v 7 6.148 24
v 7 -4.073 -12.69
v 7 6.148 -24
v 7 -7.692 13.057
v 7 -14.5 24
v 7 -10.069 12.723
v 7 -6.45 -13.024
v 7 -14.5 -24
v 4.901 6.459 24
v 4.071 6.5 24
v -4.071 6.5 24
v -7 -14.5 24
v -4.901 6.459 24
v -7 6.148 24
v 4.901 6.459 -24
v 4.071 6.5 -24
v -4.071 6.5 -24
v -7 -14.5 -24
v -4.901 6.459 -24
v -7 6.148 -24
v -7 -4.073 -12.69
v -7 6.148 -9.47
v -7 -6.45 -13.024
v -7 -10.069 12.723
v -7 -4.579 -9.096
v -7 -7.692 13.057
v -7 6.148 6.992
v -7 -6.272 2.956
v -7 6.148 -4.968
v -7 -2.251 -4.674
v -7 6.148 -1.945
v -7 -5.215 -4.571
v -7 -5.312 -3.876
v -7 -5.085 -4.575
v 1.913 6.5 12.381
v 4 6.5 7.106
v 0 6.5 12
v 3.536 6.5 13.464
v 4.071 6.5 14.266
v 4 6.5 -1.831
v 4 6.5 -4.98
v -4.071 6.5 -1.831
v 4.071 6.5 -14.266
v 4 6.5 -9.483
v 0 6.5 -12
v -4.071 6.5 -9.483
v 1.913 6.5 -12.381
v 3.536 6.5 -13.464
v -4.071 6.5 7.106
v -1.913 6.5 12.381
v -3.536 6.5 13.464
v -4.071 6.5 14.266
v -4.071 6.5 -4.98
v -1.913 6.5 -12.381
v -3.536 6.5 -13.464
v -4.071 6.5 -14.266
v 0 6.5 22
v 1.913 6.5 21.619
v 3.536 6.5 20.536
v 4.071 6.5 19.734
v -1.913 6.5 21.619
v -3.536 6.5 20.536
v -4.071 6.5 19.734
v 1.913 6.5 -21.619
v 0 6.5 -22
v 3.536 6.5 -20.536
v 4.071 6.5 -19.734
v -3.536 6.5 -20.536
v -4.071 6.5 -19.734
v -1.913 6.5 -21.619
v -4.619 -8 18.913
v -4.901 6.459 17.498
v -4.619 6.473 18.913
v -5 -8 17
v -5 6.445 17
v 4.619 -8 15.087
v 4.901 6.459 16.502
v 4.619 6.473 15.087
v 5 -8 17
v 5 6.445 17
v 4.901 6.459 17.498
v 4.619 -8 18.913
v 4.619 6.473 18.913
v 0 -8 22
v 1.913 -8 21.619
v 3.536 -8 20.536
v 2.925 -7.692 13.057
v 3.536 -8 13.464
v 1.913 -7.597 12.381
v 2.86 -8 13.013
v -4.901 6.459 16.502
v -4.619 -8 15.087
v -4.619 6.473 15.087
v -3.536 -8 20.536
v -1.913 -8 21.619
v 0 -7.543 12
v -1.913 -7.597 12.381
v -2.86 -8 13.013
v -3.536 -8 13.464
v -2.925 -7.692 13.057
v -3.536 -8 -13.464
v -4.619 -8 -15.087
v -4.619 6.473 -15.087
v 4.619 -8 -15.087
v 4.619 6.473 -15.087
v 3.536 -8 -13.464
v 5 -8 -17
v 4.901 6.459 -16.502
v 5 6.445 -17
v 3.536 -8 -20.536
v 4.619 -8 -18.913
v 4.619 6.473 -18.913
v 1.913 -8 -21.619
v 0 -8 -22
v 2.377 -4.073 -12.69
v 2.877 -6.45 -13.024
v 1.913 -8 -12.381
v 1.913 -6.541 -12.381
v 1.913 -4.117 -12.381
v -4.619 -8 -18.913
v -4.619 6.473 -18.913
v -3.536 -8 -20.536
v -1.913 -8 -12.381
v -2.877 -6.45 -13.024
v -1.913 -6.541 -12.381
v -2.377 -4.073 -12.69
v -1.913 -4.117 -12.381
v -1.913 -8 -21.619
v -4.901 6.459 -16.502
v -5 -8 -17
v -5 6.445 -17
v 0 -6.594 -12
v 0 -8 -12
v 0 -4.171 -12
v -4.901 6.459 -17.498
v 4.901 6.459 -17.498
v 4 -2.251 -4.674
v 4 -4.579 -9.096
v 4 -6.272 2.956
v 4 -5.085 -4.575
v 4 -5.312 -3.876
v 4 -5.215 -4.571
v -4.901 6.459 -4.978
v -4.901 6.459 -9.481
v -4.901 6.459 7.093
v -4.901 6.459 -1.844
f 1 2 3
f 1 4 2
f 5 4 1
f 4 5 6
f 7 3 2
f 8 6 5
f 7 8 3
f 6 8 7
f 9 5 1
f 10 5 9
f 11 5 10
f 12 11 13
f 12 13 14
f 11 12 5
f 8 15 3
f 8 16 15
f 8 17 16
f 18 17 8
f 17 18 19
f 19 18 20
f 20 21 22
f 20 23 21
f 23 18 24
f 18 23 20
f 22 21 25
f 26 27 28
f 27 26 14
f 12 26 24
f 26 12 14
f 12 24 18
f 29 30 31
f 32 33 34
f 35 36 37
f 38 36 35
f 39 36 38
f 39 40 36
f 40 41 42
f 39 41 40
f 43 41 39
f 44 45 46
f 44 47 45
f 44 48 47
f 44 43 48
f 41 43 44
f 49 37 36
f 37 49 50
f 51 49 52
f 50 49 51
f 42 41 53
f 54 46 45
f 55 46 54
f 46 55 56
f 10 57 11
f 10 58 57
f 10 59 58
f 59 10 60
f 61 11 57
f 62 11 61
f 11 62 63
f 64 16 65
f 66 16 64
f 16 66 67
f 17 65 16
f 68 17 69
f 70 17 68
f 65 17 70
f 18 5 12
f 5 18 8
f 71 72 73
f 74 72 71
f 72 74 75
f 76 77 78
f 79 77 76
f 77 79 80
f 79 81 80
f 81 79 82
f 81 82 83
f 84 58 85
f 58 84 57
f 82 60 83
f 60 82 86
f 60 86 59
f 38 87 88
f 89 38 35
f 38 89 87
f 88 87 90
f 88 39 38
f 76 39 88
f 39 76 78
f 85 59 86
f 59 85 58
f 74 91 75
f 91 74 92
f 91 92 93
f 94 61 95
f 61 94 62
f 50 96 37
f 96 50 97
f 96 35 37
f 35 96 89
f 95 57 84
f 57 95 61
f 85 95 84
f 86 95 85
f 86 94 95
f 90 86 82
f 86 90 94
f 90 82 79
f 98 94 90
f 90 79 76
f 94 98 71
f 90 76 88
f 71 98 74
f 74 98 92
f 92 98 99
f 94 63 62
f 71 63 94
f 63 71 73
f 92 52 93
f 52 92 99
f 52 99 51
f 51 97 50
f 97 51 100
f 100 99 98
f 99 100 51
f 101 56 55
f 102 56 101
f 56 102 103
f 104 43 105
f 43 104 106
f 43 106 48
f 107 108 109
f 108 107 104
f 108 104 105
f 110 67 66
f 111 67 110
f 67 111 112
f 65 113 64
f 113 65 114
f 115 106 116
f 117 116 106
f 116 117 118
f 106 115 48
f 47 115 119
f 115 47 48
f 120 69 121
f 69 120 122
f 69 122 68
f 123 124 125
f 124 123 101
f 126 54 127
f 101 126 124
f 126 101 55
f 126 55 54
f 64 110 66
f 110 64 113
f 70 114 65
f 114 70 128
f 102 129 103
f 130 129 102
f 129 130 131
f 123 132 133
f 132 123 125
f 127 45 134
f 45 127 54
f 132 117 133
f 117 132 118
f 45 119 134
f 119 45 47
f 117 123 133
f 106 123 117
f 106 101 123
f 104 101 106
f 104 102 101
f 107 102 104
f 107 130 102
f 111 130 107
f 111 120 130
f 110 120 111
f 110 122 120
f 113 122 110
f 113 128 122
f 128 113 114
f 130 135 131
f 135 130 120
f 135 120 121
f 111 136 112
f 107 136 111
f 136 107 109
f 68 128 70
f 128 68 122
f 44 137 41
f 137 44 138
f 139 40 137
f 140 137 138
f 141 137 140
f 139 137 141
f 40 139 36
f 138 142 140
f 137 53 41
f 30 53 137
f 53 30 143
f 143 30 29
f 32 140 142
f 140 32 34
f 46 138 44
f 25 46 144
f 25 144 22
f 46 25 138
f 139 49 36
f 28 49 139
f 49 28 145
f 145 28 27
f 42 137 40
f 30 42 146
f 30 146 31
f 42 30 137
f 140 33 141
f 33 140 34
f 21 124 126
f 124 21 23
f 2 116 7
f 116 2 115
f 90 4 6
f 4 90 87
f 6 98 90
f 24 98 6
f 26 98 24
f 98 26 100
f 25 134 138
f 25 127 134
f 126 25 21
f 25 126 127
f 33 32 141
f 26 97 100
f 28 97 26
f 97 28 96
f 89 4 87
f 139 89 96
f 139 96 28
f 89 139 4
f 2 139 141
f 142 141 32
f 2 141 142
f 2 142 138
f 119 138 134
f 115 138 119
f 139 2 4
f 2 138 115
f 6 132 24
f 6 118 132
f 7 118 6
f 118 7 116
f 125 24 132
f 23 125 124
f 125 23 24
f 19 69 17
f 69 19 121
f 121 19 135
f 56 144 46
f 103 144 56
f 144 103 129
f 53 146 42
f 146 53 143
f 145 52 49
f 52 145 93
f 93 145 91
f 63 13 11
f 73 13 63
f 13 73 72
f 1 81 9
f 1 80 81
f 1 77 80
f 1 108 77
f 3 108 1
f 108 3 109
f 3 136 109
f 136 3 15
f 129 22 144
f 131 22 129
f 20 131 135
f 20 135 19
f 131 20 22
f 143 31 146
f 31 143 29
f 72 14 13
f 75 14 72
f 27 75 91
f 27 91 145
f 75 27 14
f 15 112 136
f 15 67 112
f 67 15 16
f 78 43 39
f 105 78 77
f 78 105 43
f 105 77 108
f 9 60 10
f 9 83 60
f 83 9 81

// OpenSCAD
diameter=10;
height=4;
number=3;
distance=5;
baseline=30; 


module maghole(diameter,height,number,back) {
		translate([0,height*(number-2)/2,0])
        rotate([90,0,0])
         cylinder(r=diameter/2,h=height*(2*number-1),center=true);
    if(back == 1) {
		translate([0,-height*2*(number+1)/2,0])
        rotate([90,0,0])
         cylinder(r=diameter/2,h=height*number,center=true);
    }
}

module smaghole(diameter,height,number,back) {
		translate([0,.15+height*(number-2)/2,0])
        rotate([90,0,0])
         cylinder(r=0.3+diameter/2,h=height*(2*number-1),center=true);
    if(back == 1) {
		translate([0,-(0.15+height*2*(number+1)/2),0])
        rotate([90,0,0])
         cylinder(r=0.3+diameter/2,h=height*number,center=true);
    }
}
module mirror(diameter,height,number,distance,baseline) {
width=diameter+4;
depth=distance+height*number+4;
length=baseline+diameter+8;
mirrorthick = 1.8;
   difference() {
     translate([0,-height,0])
	   cube([width,  // Small dimension
            depth, // Optical path dim
		      length],center=true);
      translate([0,0,2+baseline/2])
             maghole(diameter,height,number,0);
     translate([0,0,-(2+baseline/2)])
             maghole(diameter,height,number,0);

     rotate([-2,0,0])
     translate([-4,0.5+depth/4,-7])
          cube([width+2,depth+2,((length-2*width)/2)-5.5],center=true);

     rotate([18,0,0])
     translate([-4,depth/4,0.5])
          cube([width+2,depth+2,((length-2*width)/2)-1.5],center=true);

    rotate([8,0,0])
     translate([0,-depth/3,1])
          cube([width+2,mirrorthick+0.6,length-(2*diameter+2)],center=true);
     }
}

module sensor(diameter,height,number,distance,baseline) {
width=diameter+4;
depth=distance+height*number+4;
length=baseline+diameter+8;
mirrorthick = 2.6;
extra=2*width+4;

   difference() {
     translate([2+width/2,-height,0])
	   cube([extra,  // Small dimension
            depth, // Optical path dim
		      length],center=true);
      translate([0,0,2+baseline/2])
             smaghole(diameter,height,number,1);
     translate([0,0,-(2+baseline/2)])
             smaghole(diameter,height,number,1);
//LASER
     translate([0,0,4])
        rotate([90,0,0])
             cylinder(r=3.2,h=40,center=true,$fn=24);
//PhotoTransistor
     translate([0,0,-2])
        rotate([90,0,0])
             cylinder(r=2,h=40,center=true,$fn=12);
// TEMP SENSOR
     translate([2+width,0,0])
        rotate([90,0,0])
             cylinder(r=4.7,h=40,center=true);

     }

     difference() {
     translate([0,-4,-2.5])cube([5,6,5],center=true);
     translate([0,-8,0])
        cylinder(r=3.2,h=10,center=true,$fn=12);
     translate([0,0,-1.2])
        rotate([90,0,0])
             cylinder(r=0.6,h=40,center=true,$fn=6);
     translate([0,0,-2.8])
        rotate([90,0,0])
             cylinder(r=0.6,h=40,center=true,$fn=6);
     }
}

module jarwall() {
  difference() {
     cube([40,40,120],center=true);
	  translate([40,0,0])
	     cylinder(r=50,h=120,center=true,$fn=64);
	   }
}

module jar() {
	  translate([-8,110,-10])
	          cylinder(r=50,h=120,center=true,$fn=64);
}

module powerhole(dim) {
offset = dim+2;
  //  cylinder(r=dim,h=2*dim,center=true,$fn=10);
  //  translate([dim-1.6,0,0])
   //   cylinder(r=dim,h=dim,center=true,$fn=10);
    translate([dim-3,0,0]) cube([2*dim+2,2*dim-1,2*dim-1],center=true);
    translate([-offset,0,0])
      cylinder(r=1.1,h=2*dim,center=true,$fn=10);
    translate([offset+2,0,0])
      cylinder(r=1.1,h=2*dim,center=true,$fn=10);
}

module sensordevice() {
  wall = 32;
  side = 44;
  deep = 50;
  difference() { 
   sensor(diameter,height,number,distance,baseline);
   translate([6,-60,3]) jar();
  }
  translate([-7,-(wall+30),21]) cube([wall,side+12,3]);

     translate([-7,-(wall+30),-24])
         cube([wall,side+12,3]);

  difference() {
  translate([23.5,-(wall+7),0])
    rotate([0,90,0])
    cube([side,deep,3],center=true);
     translate([24,-54,12])
			rotate([0,90,0]) 
           powerhole(4.5);
  }
}
module mirrordevice() {
  difference() { 
   mirror(diameter,height,number,distance,baseline);
   translate([0,-3.3,0]) rotate([0,0,-90]) jarwall();
  }
}

//rotate([0,90,180]) 
  // sensordevice();
   mirrordevice();



     
